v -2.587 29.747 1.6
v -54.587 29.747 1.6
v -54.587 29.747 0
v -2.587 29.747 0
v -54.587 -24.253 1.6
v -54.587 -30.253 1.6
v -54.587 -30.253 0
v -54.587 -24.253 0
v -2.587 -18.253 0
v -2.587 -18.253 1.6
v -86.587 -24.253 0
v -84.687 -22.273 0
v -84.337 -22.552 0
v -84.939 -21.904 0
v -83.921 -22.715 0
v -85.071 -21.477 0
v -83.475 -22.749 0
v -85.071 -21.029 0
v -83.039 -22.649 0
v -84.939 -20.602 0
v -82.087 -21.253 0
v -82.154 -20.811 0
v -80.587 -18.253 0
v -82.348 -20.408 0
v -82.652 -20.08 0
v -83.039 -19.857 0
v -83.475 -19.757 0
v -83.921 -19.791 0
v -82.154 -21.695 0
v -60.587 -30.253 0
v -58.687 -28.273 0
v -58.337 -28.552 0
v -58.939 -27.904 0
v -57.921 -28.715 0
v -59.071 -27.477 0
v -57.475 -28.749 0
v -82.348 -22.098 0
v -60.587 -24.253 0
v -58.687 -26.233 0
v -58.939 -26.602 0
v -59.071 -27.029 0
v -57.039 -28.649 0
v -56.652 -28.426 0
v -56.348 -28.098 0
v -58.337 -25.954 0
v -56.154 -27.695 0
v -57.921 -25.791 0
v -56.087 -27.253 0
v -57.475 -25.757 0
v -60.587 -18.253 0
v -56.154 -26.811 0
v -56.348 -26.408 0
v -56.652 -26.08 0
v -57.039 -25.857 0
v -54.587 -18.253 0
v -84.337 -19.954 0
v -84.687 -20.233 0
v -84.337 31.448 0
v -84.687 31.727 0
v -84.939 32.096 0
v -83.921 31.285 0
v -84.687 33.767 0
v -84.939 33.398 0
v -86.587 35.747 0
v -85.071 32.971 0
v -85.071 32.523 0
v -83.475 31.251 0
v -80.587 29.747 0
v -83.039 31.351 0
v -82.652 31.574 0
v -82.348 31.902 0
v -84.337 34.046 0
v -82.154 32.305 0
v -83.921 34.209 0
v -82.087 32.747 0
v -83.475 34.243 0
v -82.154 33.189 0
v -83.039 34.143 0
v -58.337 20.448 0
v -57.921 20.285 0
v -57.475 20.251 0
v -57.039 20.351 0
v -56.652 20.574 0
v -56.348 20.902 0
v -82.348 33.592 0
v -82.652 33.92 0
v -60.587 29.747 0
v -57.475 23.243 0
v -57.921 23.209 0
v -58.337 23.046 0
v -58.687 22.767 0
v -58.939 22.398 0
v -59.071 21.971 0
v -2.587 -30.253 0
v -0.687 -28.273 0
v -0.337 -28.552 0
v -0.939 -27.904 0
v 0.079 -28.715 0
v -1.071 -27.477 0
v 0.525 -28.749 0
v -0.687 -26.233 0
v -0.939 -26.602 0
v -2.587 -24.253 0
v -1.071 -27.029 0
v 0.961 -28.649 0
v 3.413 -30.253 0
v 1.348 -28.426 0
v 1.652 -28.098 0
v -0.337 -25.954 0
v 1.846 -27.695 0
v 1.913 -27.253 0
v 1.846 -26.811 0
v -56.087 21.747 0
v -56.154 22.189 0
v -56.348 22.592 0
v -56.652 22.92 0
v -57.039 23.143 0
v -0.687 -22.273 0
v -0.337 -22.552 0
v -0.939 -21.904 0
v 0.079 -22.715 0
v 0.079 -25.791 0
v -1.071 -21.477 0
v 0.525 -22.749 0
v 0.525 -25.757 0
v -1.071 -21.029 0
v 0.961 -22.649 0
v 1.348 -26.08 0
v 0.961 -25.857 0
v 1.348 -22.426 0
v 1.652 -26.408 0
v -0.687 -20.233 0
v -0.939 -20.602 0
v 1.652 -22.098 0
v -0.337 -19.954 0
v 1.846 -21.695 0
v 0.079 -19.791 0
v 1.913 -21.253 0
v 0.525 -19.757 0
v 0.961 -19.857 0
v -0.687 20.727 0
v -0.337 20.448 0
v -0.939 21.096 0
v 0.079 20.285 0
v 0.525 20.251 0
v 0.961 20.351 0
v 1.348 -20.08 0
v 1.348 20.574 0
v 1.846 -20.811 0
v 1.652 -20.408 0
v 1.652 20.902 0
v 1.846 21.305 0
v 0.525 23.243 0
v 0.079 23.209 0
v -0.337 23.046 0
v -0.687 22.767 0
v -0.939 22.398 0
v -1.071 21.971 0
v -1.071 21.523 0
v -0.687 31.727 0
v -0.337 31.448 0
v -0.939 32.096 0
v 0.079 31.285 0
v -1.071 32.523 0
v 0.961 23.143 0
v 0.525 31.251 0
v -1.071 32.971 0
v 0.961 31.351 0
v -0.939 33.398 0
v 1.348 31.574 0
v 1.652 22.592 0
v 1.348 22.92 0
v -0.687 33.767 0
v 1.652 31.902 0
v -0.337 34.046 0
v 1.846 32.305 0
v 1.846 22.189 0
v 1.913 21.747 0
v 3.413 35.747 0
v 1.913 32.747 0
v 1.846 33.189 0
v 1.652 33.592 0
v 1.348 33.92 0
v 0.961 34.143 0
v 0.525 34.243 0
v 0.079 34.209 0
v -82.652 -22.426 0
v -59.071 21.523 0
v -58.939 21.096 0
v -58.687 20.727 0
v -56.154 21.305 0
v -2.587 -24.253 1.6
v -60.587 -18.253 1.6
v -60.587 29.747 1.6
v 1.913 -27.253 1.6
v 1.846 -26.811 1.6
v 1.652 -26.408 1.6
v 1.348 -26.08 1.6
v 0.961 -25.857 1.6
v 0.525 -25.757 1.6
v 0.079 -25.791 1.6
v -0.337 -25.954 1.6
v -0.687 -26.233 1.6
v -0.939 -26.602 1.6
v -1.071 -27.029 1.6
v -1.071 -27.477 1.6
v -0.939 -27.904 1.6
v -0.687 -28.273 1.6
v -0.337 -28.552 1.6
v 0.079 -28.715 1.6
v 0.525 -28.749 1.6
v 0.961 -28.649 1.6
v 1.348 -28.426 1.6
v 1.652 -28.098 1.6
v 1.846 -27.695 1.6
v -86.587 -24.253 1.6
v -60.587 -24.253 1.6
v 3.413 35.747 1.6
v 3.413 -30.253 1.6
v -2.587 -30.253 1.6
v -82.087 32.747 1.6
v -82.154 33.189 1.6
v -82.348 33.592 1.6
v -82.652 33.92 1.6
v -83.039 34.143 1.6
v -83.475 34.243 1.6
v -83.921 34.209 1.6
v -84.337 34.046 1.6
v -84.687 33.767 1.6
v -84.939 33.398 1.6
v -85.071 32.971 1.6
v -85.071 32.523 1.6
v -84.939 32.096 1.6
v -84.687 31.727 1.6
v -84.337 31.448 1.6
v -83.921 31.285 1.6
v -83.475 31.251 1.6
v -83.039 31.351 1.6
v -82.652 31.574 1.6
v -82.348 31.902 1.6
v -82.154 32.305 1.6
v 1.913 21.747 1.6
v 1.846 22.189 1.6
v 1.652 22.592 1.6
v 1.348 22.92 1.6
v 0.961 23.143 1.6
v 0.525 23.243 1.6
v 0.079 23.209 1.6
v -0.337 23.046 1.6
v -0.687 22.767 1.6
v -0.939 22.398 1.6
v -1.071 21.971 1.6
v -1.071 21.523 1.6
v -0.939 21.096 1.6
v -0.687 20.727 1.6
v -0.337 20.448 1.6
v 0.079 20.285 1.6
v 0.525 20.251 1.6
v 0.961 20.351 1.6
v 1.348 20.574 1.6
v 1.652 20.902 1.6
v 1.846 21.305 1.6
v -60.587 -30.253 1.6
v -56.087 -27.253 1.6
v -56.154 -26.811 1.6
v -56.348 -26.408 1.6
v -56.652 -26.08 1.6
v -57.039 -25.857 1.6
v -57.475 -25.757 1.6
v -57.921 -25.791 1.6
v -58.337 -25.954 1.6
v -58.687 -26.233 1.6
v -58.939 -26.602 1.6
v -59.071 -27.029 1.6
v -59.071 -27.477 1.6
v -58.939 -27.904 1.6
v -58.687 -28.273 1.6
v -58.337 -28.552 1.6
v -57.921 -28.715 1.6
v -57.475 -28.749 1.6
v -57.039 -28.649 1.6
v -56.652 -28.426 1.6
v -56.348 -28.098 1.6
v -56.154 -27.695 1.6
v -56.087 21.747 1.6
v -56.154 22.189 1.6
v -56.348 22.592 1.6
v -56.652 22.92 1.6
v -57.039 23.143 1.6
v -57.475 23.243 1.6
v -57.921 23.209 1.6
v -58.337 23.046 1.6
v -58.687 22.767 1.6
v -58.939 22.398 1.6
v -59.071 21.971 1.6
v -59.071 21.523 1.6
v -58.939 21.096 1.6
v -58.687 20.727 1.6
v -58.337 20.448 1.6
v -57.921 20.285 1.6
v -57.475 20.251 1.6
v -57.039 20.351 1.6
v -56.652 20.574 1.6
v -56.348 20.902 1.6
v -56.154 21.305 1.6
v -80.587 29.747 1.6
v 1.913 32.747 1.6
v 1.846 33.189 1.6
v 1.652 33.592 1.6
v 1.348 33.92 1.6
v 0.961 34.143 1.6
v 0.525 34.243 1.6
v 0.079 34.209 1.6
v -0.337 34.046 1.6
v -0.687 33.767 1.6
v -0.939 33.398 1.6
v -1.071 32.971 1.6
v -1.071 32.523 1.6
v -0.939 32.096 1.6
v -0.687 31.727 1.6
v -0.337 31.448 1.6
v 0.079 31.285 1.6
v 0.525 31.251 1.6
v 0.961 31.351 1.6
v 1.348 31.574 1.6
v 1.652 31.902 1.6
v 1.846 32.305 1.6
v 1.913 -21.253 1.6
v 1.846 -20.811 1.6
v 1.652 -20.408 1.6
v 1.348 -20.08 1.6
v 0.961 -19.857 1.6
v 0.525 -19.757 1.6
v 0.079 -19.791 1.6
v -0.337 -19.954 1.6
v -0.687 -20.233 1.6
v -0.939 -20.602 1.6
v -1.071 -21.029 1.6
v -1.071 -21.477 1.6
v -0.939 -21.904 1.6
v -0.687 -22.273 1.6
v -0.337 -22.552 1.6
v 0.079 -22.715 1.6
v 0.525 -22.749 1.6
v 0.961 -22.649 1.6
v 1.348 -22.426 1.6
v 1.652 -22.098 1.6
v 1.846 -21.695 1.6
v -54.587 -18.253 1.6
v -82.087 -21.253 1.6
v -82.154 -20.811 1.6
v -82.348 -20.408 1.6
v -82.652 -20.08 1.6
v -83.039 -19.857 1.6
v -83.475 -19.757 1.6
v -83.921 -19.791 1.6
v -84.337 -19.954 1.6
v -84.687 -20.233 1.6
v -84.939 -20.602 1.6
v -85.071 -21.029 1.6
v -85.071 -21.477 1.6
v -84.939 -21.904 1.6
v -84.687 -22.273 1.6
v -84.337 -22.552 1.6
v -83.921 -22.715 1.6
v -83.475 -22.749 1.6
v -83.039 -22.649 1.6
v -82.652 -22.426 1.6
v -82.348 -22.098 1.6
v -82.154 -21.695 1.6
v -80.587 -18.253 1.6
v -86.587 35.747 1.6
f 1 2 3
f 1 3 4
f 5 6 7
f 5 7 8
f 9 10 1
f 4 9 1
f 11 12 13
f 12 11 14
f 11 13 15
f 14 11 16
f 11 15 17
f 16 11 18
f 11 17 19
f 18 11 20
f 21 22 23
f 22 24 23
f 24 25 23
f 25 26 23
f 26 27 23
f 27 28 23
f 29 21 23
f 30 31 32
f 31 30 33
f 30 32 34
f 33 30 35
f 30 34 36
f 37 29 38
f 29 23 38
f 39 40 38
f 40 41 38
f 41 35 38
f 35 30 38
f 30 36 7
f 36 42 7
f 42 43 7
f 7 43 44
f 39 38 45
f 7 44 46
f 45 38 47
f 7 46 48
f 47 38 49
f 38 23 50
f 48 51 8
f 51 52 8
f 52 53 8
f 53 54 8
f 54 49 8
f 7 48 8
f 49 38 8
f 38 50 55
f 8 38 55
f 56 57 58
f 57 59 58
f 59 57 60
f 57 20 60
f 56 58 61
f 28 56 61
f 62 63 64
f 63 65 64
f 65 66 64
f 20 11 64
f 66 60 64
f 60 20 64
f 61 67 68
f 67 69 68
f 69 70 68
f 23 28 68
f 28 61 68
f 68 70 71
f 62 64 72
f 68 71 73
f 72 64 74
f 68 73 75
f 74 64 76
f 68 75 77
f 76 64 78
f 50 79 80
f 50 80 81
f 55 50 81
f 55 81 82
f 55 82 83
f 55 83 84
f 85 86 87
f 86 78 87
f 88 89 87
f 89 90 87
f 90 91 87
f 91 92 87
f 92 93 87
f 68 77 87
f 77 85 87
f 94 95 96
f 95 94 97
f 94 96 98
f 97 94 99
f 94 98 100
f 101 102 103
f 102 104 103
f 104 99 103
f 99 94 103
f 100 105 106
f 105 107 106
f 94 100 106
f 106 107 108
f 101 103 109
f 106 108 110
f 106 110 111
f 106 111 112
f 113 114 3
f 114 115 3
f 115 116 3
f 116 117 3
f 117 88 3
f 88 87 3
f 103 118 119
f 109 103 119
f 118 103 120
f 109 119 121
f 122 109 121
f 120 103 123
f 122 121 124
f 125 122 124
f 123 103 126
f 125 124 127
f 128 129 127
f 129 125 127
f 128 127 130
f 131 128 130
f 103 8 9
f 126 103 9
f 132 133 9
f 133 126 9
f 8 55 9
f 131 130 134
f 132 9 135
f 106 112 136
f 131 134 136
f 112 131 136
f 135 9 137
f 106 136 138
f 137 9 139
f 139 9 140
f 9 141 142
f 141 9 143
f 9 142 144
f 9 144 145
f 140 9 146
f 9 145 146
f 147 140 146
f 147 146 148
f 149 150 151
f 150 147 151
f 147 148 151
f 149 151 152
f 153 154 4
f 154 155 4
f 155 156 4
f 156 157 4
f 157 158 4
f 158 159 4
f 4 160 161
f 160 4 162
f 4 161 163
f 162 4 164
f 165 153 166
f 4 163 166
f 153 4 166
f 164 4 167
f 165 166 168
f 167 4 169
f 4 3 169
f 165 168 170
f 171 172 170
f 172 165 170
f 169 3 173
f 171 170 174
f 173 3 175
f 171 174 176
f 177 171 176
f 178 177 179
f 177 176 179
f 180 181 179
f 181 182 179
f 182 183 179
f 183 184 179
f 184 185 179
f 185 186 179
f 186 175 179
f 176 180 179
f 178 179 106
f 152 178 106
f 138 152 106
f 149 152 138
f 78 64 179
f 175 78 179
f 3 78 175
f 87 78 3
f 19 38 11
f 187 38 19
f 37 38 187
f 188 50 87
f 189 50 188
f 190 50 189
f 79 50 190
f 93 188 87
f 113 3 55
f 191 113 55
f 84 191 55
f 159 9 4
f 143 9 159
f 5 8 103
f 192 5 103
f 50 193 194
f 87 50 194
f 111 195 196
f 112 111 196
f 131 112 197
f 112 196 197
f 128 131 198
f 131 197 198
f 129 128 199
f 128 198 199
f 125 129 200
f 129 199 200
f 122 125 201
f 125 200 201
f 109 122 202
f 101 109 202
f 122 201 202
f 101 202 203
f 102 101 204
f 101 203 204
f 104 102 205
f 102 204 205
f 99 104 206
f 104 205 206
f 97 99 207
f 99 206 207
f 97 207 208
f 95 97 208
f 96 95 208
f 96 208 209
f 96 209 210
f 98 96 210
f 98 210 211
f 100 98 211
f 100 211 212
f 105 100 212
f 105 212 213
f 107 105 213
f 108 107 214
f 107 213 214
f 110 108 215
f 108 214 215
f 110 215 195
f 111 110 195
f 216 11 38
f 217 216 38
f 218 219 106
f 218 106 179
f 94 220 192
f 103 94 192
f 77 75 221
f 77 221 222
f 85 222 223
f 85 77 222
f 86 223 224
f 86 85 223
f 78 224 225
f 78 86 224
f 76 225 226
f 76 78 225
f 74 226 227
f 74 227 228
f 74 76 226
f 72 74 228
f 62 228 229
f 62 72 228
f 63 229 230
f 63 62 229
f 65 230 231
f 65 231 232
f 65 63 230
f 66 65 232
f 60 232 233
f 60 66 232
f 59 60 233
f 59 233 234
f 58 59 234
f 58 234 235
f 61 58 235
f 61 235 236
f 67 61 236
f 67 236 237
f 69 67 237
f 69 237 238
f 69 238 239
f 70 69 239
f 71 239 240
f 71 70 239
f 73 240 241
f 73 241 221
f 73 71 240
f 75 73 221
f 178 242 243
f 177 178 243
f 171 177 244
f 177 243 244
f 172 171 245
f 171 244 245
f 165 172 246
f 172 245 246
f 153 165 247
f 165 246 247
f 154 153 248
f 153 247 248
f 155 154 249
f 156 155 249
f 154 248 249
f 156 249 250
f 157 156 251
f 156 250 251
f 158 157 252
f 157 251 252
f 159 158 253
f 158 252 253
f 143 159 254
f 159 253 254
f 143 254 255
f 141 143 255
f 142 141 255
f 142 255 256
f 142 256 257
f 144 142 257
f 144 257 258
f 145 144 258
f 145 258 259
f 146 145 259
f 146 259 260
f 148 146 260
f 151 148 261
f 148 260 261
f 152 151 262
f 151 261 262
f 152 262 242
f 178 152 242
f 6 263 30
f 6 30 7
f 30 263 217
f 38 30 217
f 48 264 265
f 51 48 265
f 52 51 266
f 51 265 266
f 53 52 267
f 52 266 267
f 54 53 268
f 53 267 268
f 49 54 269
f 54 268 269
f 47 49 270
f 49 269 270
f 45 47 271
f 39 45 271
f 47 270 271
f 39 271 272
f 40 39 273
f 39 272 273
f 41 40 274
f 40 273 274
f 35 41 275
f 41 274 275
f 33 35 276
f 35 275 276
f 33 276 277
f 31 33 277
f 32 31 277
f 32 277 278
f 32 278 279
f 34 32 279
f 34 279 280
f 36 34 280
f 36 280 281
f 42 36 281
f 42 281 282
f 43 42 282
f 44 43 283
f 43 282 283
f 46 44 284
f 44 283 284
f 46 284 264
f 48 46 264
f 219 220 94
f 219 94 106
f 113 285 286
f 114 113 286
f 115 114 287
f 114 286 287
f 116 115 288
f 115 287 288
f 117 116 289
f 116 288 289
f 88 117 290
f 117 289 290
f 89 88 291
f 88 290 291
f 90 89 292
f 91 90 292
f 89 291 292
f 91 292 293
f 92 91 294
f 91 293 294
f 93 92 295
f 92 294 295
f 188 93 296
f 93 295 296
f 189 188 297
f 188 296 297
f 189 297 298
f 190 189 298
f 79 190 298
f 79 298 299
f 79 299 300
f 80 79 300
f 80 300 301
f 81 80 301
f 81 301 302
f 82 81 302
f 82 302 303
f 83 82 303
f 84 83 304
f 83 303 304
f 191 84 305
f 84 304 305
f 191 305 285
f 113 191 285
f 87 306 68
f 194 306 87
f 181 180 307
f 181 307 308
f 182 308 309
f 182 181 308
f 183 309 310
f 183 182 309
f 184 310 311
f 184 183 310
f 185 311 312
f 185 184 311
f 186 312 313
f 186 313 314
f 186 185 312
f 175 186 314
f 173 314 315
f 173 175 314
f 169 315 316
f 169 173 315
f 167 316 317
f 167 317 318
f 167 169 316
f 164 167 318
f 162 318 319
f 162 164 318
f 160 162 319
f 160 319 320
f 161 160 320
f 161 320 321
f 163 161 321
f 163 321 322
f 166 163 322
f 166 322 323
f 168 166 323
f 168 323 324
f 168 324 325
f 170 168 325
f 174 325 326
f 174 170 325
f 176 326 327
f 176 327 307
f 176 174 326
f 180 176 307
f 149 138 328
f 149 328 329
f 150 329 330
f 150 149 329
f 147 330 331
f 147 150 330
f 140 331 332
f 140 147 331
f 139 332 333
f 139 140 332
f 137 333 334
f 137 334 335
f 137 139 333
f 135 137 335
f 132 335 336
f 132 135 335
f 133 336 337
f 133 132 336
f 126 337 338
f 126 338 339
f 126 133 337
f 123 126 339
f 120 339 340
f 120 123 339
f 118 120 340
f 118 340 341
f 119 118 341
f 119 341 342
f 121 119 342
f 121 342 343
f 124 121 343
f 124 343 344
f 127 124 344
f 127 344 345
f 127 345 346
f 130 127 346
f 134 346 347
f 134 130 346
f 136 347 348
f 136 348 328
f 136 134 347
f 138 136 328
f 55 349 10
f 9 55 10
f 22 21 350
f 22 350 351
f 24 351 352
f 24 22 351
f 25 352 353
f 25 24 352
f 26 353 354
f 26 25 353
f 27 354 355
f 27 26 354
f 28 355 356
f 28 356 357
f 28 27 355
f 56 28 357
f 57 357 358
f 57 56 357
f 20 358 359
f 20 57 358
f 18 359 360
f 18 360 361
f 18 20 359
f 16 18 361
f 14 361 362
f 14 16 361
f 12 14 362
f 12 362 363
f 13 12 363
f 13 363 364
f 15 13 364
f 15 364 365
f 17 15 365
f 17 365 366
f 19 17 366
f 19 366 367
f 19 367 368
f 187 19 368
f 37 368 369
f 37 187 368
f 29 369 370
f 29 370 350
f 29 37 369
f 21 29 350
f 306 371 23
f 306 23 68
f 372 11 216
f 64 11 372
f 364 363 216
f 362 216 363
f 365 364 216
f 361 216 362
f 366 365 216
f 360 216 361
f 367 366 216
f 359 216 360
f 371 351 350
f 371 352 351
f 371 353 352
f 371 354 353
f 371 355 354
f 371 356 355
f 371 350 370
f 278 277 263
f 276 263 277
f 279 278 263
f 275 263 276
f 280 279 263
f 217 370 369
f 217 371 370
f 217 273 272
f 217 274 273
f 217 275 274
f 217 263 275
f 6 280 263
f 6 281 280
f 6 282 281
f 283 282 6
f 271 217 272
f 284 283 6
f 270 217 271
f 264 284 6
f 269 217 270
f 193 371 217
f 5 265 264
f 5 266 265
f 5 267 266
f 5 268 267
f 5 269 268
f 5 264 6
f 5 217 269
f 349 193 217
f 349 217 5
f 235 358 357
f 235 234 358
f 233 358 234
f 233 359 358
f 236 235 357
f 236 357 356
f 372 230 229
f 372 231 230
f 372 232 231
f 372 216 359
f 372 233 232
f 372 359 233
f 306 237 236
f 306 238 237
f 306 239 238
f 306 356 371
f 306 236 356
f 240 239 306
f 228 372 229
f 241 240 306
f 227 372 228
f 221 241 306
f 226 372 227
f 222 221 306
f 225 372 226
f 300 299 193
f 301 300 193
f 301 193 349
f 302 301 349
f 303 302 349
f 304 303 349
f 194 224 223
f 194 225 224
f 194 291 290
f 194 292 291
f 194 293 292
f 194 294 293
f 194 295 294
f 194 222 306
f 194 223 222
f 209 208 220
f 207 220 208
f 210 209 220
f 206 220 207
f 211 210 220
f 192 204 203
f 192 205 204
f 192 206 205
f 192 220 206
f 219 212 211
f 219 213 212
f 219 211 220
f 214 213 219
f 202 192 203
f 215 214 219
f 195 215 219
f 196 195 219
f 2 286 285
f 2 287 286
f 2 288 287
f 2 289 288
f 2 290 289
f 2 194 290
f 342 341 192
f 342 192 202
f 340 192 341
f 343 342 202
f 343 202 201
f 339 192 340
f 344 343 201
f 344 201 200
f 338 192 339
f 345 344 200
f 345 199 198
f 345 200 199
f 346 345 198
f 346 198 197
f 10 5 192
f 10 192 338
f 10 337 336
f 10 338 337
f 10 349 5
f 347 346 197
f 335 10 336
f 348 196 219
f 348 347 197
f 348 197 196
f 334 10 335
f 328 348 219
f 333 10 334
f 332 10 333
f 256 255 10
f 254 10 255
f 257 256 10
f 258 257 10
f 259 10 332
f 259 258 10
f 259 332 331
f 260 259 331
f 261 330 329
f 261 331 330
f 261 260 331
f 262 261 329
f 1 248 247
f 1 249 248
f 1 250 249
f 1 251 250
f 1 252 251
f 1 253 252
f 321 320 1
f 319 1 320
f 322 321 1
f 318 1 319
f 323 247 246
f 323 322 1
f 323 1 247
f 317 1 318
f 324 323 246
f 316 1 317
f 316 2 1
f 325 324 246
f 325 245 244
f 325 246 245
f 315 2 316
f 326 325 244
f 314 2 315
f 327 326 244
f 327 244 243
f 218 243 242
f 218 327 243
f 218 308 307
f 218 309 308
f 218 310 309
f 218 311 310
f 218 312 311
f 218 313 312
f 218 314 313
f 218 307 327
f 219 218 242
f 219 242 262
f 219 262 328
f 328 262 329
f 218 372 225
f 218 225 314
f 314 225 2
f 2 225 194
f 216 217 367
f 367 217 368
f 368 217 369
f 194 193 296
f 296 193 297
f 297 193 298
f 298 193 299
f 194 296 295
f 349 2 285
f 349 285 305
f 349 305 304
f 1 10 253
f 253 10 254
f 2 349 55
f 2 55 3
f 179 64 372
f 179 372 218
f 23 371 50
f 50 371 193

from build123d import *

# Parameters (mm, degrees)
PLATES_BASE_OUTLINE_W   = 90
PLATES_BASE_OUTLINE_H   = 60
PLATES_BASE_OUTLINE_R   = 1.5
PLATES_BASE_OUTLINE_W_2 = 76
PLATES_BASE_OUTLINE_H_2 = 20
PLATES_BASE_DEPTH       = 1.6
SKETCH_4_W              = 78
SKETCH_4_H              = 48
CUT_EXTRUDE_1_DEPTH     = 94.689835584
SKETCH_7_W              = 6
SKETCH_7_H              = 6
EXTRUDE_4_DEPTH         = 1.6
SKETCH_8_W              = 6
SKETCH_8_H              = 48
EXTRUDE_5_DEPTH         = 1.6
SKETCH_10_R             = 1.5
CUT_EXTRUDE_4_DEPTH     = 1.6


# Read off the part's stored shape, not the designer's step: plates=base
with BuildPart() as part:
    # plates=base outline → plates=base (new body)
    with BuildSketch(Plane.XY):
        with Locations((-41.587399894, 5.746992481)):
            Rectangle(PLATES_BASE_OUTLINE_W, PLATES_BASE_OUTLINE_H)
        with Locations((-83.587399894, -21.253007519)):
            Circle(PLATES_BASE_OUTLINE_R, mode=Mode.SUBTRACT)
        with Locations((0.412600106, -21.253007519)):
            Circle(PLATES_BASE_OUTLINE_R, mode=Mode.SUBTRACT)
        with Locations((-41.587399894, -7.253007519)):
            Rectangle(PLATES_BASE_OUTLINE_W_2, PLATES_BASE_OUTLINE_H_2, mode=Mode.SUBTRACT)
        with Locations((-78.587399894, 5.746992481)):
            Circle(PLATES_BASE_OUTLINE_R, mode=Mode.SUBTRACT)
        with Locations((-83.587399894, 32.746992481)):
            Circle(PLATES_BASE_OUTLINE_R, mode=Mode.SUBTRACT)
        with Locations((-41.587399894, 18.746992481)):
            Rectangle(PLATES_BASE_OUTLINE_W_2, PLATES_BASE_OUTLINE_H_2, mode=Mode.SUBTRACT)
        with Locations((-4.587399894, 5.746992481)):
            Circle(PLATES_BASE_OUTLINE_R, mode=Mode.SUBTRACT)
        with Locations((0.412600106, 32.746992481)):
            Circle(PLATES_BASE_OUTLINE_R, mode=Mode.SUBTRACT)
    extrude(amount=PLATES_BASE_DEPTH)

    # ｽｹｯﾁ4 → ｶｯﾄ - 押し出し1 (cut, through all)
    with BuildSketch(Plane.XY.offset(1.6)):
        with Locations((-41.587399894, 5.746992481)):
            Rectangle(SKETCH_4_W, SKETCH_4_H)
    extrude(amount=-CUT_EXTRUDE_1_DEPTH, mode=Mode.SUBTRACT)

    # ｽｹｯﾁ7 → ﾎﾞｽ - 押し出し4 (add)
    with BuildSketch(Plane.XY.offset(1.6)):
        with Locations((0.412600106, -27.253007519)):
            Rectangle(SKETCH_7_W, SKETCH_7_H)
        with Locations((-57.587399894, -27.253007519)):
            Rectangle(SKETCH_7_W, SKETCH_7_H)
    extrude(amount=-EXTRUDE_4_DEPTH)

    # ｽｹｯﾁ8 → ﾎﾞｽ - 押し出し5 (add)
    with BuildSketch(Plane.XY.offset(1.6)):
        with Locations((-57.587399894, 5.746992481)):
            Rectangle(SKETCH_8_W, SKETCH_8_H)
    extrude(amount=-EXTRUDE_5_DEPTH)

    # ｽｹｯﾁ10 → ｶｯﾄ - 押し出し4 (cut)
    with BuildSketch(Plane.XY.offset(1.6)):
        with Locations((0.412600106, -27.253007519)):
            Circle(SKETCH_10_R)
        with Locations((-57.587399894, -27.253007519)):
            Circle(SKETCH_10_R)
        with Locations((-57.587399894, 21.746992481)):
            Circle(SKETCH_10_R)
        with Locations((0.412600106, 21.746992481)):
            Circle(SKETCH_10_R)
    extrude(amount=-CUT_EXTRUDE_4_DEPTH, mode=Mode.SUBTRACT)


solid = part.part
